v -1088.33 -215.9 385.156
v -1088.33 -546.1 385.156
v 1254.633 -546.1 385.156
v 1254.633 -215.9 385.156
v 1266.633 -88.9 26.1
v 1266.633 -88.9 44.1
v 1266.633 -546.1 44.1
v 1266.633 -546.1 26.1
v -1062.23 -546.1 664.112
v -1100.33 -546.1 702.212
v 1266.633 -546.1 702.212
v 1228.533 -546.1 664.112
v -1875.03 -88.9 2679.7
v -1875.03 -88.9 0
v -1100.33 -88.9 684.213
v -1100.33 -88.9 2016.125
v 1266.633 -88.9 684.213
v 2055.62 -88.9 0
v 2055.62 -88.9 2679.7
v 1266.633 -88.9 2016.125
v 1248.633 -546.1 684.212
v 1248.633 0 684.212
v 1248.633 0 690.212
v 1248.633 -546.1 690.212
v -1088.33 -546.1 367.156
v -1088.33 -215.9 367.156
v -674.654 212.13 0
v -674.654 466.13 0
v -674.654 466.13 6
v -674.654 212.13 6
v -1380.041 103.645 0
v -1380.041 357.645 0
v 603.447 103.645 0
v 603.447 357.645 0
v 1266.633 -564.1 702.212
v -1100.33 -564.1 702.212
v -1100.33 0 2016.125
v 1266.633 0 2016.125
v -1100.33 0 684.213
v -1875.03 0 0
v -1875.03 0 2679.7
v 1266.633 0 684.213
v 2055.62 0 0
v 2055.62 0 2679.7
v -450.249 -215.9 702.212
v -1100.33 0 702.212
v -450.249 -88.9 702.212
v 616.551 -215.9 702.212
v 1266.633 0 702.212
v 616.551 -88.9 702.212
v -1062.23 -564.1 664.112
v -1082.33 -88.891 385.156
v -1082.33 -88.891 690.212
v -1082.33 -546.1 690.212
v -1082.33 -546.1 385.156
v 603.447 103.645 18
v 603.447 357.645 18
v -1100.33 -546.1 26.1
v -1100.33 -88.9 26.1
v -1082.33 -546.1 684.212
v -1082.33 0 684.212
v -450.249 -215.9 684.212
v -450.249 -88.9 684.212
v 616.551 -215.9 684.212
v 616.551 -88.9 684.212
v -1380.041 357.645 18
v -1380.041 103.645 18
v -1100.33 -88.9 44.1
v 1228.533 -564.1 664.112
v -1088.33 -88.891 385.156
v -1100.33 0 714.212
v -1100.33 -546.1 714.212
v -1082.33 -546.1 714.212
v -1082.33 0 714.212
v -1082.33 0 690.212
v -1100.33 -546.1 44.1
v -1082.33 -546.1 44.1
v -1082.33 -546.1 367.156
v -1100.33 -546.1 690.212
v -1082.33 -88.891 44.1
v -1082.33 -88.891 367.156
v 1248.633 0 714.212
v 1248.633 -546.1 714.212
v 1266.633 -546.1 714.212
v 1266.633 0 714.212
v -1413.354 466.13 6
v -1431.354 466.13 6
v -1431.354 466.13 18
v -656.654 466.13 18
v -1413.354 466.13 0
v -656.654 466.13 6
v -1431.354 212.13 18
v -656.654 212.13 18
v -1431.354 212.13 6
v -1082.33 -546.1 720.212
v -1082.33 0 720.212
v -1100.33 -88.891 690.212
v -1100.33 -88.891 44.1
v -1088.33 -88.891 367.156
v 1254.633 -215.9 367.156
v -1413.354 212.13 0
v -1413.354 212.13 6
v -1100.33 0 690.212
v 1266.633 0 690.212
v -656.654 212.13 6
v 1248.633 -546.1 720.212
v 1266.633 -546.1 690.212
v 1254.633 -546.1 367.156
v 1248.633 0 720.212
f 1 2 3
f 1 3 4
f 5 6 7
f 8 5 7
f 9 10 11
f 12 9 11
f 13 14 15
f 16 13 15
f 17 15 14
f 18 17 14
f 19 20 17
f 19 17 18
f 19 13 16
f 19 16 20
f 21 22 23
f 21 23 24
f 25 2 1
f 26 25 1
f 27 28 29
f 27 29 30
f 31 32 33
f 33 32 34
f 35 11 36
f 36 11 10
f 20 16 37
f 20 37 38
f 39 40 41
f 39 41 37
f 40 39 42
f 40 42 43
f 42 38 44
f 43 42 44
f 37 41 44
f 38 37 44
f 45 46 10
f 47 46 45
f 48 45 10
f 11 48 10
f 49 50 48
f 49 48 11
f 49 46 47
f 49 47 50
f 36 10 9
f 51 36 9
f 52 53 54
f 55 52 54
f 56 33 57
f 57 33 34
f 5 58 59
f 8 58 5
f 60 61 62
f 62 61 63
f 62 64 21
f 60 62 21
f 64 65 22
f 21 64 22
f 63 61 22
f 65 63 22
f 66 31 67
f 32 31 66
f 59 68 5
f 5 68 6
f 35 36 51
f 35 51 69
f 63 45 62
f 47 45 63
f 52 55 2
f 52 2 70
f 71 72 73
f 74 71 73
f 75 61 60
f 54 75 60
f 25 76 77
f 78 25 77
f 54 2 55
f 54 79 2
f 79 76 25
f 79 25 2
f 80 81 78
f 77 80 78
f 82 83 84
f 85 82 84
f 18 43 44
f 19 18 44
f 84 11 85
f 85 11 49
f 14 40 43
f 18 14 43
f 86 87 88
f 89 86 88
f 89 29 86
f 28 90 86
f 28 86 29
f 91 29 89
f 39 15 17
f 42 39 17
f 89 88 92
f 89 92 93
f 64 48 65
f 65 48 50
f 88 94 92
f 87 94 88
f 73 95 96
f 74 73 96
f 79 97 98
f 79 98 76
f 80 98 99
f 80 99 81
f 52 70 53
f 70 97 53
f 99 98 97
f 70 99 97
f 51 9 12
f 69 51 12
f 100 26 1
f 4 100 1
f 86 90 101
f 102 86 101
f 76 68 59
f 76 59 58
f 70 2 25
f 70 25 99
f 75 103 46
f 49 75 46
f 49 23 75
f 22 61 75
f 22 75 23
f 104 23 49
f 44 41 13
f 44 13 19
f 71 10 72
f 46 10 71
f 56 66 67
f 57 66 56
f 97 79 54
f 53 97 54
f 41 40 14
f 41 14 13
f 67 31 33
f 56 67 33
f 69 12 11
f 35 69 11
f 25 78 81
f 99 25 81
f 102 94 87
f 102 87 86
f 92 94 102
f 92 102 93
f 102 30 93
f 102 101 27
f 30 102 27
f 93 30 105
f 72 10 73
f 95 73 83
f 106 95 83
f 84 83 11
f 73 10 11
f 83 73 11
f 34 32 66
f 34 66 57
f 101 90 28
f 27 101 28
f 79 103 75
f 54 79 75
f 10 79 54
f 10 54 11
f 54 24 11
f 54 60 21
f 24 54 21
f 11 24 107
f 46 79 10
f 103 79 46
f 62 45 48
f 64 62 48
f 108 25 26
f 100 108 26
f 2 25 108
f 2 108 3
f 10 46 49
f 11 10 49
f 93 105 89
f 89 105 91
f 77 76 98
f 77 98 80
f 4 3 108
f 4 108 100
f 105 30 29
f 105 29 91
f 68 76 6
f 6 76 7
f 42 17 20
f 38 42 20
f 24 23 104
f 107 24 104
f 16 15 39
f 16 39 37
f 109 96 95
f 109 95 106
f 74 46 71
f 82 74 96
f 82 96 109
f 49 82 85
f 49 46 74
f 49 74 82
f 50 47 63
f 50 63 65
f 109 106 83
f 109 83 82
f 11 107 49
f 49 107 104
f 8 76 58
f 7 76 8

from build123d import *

# Parameters (mm, degrees)
F5_W      = 3930.65
F5_H      = 2679.7
F6_DEPTH  = 88.9
F7_W      = 2366.9625
F7_H      = 1331.9125
F8_DEPTH  = 101.6
F9_W      = 2366.9625
F9_H      = 546.1
F10_DEPTH = 18
F11_W     = 18
F11_H     = 546.1
F12_DEPTH = 6
F13_W     = 1066.8
F13_H     = 127
F14_DEPTH = 25.4
F15_W     = 18
F15_H     = 457.2087098718
F16_DEPTH = 646.1125
F18_DEPTH = 18
F19_W     = 457.2087098718
F19_H     = 18
F20_DEPTH = 6
F21_W     = 330.2
F21_H     = 18
F22_DEPTH = 2342.9625
F23_W     = 2366.9625
F23_H     = 457.2
F24_DEPTH = 18
F26_W     = 2366.9625
F26_H     = 546.1
F27_DEPTH = 18
F28_W     = 18
F28_H     = 546.1
F29_DEPTH = 6
F30_W     = 774.7
F30_H     = 254
F31_DEPTH = 18
F32_W     = 18
F32_H     = 254
F33_DEPTH = 6
F34_W     = 1983.4875
F34_H     = 254
F35_DEPTH = 18
F36_W     = 2366.9625
F36_H     = 457.2
F37_DEPTH = 18


with BuildPart() as f6:
    # F5 (on Front) → F6 (new body)
    with BuildSketch(Plane.XZ):
        with Locations((90.2952486297, 1339.85)):
            Rectangle(F5_W, F5_H)
    extrude(amount=F6_DEPTH)

    # F7 (on face) → F8 (cut)
    with BuildSketch(Plane.XZ.offset(88.9)):
        with Locations((83.1514986297, 1350.16875)):
            Rectangle(F7_W, F7_H)
    extrude(amount=-F8_DEPTH, mode=Mode.SUBTRACT)


with BuildPart() as f10:
    # F9 (on face) → F10 (new body)
    with BuildSketch(Plane.XY.offset(684.2125)):
        with Locations((83.1514986297, -273.05)):
            Rectangle(F9_W, F9_H)
    extrude(amount=F10_DEPTH)

    # F11 (on face) → F12 (cut)
    with BuildSketch(Plane(origin=(0, 0, 684.2125), x_dir=(1, 0, 0), z_dir=(0, 0, -1))):
        with Locations((-1091.3297513703, 273.05)):
            Rectangle(F11_W, F11_H)
        with Locations((1257.6327486297, 273.05)):
            Rectangle(F11_W, F11_H)
    extrude(amount=-F12_DEPTH, mode=Mode.SUBTRACT)

    # F13 (on face) → F14 (cut)
    with BuildSketch(Plane.XY.offset(702.2125)):
        with Locations((83.1514986297, -152.4)):
            Rectangle(F13_W, F13_H)
    extrude(amount=-F14_DEPTH, mode=Mode.SUBTRACT)


with BuildPart() as f16:
    # F15 (on face) → F16 (new body)
    with BuildSketch(Plane(origin=(0, 0, 690.2125), x_dir=(1, 0, 0), z_dir=(0, 0, -1))):
        with Locations((-1091.3297513703, 317.4956450641)):
            Rectangle(F15_W, F15_H)
    extrude(amount=F16_DEPTH)

    # F19 (on face) → F20 (cut)
    with BuildSketch(Plane.YZ.offset(-1082.3297513703)):
        with Locations((-317.4956450641, 376.15625)):
            Rectangle(F19_W, F19_H)
    extrude(amount=-F20_DEPTH, mode=Mode.SUBTRACT)


with BuildPart() as f18:
    # F17 (on face) → F18 (new body)
    with BuildSketch(Plane.XZ.offset(546.1)):
        Polygon((1266.6327486297, 702.2125), (-1100.3297513703, 702.2125), (-1062.2297513703, 664.1125), (1228.5327486297, 664.1125), align=None)
    extrude(amount=F18_DEPTH)


with BuildPart() as f22:
    # F21 (on face) → F22 (new body)
    with BuildSketch(Plane.YZ.offset(-1088.3297513703)):
        with Locations((-381, 376.15625)):
            Rectangle(F21_W, F21_H)
    extrude(amount=F22_DEPTH)


with BuildPart() as f24:
    # F23 (on face) → F24 (new body)
    with BuildSketch(Plane(origin=(0, 0, 0), x_dir=(1, 0, 0), z_dir=(0, 0, -1))):
        with Locations((82.3105909348, 317.5)):
            Rectangle(F23_W, F23_H)
    extrude(amount=-F24_DEPTH)


with BuildPart() as f27:
    # F26 (on face) → F27 (new body)
    with BuildSketch(Plane.XY.offset(702.2125)):
        with Locations((83.1514986297, -273.05)):
            Rectangle(F26_W, F26_H)
    extrude(amount=F27_DEPTH)

    # F28 (on face) → F29 (cut)
    with BuildSketch(Plane.XY.offset(720.2125)):
        with Locations((-1091.3297513703, -273.05)):
            Rectangle(F28_W, F28_H)
        with Locations((1257.6327486297, -273.05)):
            Rectangle(F28_W, F28_H)
    extrude(amount=-F29_DEPTH, mode=Mode.SUBTRACT)


with BuildPart() as f31:
    # F30 (on Top) → F31 (new body)
    with BuildSketch(Plane.XY):
        with Locations((-1044.0037846565, 339.1300391686)):
            Rectangle(F30_W, F30_H)
    extrude(amount=F31_DEPTH)

    # F32 (on face) → F33 (cut)
    with BuildSketch(Plane(origin=(0, 0, 0), x_dir=(1, 0, 0), z_dir=(0, 0, -1))):
        with Locations((-1422.3537846565, -339.1300391686)):
            Rectangle(F32_W, F32_H)
        with Locations((-665.6537846565, -339.1300391686)):
            Rectangle(F32_W, F32_H)
    extrude(amount=-F33_DEPTH, mode=Mode.SUBTRACT)


with BuildPart() as f35:
    # F34 (on Top) → F35 (new body)
    with BuildSketch(Plane.XY):
        with Locations((-388.2970929861, 230.6447712948)):
            Rectangle(F34_W, F34_H)
    extrude(amount=F35_DEPTH)


with BuildPart() as f37:
    # F36 (on face) → F37 (new body)
    with BuildSketch(Plane(origin=(0, 0, 44.1), x_dir=(1, 0, 0), z_dir=(0, 0, -1))):
        with Locations((83.1514986297, 317.5)):
            Rectangle(F36_W, F36_H)
    extrude(amount=F37_DEPTH)


solid = Compound([f6.part, f10.part, f16.part, f18.part, f22.part, f27.part, f31.part, f35.part, f37.part])
